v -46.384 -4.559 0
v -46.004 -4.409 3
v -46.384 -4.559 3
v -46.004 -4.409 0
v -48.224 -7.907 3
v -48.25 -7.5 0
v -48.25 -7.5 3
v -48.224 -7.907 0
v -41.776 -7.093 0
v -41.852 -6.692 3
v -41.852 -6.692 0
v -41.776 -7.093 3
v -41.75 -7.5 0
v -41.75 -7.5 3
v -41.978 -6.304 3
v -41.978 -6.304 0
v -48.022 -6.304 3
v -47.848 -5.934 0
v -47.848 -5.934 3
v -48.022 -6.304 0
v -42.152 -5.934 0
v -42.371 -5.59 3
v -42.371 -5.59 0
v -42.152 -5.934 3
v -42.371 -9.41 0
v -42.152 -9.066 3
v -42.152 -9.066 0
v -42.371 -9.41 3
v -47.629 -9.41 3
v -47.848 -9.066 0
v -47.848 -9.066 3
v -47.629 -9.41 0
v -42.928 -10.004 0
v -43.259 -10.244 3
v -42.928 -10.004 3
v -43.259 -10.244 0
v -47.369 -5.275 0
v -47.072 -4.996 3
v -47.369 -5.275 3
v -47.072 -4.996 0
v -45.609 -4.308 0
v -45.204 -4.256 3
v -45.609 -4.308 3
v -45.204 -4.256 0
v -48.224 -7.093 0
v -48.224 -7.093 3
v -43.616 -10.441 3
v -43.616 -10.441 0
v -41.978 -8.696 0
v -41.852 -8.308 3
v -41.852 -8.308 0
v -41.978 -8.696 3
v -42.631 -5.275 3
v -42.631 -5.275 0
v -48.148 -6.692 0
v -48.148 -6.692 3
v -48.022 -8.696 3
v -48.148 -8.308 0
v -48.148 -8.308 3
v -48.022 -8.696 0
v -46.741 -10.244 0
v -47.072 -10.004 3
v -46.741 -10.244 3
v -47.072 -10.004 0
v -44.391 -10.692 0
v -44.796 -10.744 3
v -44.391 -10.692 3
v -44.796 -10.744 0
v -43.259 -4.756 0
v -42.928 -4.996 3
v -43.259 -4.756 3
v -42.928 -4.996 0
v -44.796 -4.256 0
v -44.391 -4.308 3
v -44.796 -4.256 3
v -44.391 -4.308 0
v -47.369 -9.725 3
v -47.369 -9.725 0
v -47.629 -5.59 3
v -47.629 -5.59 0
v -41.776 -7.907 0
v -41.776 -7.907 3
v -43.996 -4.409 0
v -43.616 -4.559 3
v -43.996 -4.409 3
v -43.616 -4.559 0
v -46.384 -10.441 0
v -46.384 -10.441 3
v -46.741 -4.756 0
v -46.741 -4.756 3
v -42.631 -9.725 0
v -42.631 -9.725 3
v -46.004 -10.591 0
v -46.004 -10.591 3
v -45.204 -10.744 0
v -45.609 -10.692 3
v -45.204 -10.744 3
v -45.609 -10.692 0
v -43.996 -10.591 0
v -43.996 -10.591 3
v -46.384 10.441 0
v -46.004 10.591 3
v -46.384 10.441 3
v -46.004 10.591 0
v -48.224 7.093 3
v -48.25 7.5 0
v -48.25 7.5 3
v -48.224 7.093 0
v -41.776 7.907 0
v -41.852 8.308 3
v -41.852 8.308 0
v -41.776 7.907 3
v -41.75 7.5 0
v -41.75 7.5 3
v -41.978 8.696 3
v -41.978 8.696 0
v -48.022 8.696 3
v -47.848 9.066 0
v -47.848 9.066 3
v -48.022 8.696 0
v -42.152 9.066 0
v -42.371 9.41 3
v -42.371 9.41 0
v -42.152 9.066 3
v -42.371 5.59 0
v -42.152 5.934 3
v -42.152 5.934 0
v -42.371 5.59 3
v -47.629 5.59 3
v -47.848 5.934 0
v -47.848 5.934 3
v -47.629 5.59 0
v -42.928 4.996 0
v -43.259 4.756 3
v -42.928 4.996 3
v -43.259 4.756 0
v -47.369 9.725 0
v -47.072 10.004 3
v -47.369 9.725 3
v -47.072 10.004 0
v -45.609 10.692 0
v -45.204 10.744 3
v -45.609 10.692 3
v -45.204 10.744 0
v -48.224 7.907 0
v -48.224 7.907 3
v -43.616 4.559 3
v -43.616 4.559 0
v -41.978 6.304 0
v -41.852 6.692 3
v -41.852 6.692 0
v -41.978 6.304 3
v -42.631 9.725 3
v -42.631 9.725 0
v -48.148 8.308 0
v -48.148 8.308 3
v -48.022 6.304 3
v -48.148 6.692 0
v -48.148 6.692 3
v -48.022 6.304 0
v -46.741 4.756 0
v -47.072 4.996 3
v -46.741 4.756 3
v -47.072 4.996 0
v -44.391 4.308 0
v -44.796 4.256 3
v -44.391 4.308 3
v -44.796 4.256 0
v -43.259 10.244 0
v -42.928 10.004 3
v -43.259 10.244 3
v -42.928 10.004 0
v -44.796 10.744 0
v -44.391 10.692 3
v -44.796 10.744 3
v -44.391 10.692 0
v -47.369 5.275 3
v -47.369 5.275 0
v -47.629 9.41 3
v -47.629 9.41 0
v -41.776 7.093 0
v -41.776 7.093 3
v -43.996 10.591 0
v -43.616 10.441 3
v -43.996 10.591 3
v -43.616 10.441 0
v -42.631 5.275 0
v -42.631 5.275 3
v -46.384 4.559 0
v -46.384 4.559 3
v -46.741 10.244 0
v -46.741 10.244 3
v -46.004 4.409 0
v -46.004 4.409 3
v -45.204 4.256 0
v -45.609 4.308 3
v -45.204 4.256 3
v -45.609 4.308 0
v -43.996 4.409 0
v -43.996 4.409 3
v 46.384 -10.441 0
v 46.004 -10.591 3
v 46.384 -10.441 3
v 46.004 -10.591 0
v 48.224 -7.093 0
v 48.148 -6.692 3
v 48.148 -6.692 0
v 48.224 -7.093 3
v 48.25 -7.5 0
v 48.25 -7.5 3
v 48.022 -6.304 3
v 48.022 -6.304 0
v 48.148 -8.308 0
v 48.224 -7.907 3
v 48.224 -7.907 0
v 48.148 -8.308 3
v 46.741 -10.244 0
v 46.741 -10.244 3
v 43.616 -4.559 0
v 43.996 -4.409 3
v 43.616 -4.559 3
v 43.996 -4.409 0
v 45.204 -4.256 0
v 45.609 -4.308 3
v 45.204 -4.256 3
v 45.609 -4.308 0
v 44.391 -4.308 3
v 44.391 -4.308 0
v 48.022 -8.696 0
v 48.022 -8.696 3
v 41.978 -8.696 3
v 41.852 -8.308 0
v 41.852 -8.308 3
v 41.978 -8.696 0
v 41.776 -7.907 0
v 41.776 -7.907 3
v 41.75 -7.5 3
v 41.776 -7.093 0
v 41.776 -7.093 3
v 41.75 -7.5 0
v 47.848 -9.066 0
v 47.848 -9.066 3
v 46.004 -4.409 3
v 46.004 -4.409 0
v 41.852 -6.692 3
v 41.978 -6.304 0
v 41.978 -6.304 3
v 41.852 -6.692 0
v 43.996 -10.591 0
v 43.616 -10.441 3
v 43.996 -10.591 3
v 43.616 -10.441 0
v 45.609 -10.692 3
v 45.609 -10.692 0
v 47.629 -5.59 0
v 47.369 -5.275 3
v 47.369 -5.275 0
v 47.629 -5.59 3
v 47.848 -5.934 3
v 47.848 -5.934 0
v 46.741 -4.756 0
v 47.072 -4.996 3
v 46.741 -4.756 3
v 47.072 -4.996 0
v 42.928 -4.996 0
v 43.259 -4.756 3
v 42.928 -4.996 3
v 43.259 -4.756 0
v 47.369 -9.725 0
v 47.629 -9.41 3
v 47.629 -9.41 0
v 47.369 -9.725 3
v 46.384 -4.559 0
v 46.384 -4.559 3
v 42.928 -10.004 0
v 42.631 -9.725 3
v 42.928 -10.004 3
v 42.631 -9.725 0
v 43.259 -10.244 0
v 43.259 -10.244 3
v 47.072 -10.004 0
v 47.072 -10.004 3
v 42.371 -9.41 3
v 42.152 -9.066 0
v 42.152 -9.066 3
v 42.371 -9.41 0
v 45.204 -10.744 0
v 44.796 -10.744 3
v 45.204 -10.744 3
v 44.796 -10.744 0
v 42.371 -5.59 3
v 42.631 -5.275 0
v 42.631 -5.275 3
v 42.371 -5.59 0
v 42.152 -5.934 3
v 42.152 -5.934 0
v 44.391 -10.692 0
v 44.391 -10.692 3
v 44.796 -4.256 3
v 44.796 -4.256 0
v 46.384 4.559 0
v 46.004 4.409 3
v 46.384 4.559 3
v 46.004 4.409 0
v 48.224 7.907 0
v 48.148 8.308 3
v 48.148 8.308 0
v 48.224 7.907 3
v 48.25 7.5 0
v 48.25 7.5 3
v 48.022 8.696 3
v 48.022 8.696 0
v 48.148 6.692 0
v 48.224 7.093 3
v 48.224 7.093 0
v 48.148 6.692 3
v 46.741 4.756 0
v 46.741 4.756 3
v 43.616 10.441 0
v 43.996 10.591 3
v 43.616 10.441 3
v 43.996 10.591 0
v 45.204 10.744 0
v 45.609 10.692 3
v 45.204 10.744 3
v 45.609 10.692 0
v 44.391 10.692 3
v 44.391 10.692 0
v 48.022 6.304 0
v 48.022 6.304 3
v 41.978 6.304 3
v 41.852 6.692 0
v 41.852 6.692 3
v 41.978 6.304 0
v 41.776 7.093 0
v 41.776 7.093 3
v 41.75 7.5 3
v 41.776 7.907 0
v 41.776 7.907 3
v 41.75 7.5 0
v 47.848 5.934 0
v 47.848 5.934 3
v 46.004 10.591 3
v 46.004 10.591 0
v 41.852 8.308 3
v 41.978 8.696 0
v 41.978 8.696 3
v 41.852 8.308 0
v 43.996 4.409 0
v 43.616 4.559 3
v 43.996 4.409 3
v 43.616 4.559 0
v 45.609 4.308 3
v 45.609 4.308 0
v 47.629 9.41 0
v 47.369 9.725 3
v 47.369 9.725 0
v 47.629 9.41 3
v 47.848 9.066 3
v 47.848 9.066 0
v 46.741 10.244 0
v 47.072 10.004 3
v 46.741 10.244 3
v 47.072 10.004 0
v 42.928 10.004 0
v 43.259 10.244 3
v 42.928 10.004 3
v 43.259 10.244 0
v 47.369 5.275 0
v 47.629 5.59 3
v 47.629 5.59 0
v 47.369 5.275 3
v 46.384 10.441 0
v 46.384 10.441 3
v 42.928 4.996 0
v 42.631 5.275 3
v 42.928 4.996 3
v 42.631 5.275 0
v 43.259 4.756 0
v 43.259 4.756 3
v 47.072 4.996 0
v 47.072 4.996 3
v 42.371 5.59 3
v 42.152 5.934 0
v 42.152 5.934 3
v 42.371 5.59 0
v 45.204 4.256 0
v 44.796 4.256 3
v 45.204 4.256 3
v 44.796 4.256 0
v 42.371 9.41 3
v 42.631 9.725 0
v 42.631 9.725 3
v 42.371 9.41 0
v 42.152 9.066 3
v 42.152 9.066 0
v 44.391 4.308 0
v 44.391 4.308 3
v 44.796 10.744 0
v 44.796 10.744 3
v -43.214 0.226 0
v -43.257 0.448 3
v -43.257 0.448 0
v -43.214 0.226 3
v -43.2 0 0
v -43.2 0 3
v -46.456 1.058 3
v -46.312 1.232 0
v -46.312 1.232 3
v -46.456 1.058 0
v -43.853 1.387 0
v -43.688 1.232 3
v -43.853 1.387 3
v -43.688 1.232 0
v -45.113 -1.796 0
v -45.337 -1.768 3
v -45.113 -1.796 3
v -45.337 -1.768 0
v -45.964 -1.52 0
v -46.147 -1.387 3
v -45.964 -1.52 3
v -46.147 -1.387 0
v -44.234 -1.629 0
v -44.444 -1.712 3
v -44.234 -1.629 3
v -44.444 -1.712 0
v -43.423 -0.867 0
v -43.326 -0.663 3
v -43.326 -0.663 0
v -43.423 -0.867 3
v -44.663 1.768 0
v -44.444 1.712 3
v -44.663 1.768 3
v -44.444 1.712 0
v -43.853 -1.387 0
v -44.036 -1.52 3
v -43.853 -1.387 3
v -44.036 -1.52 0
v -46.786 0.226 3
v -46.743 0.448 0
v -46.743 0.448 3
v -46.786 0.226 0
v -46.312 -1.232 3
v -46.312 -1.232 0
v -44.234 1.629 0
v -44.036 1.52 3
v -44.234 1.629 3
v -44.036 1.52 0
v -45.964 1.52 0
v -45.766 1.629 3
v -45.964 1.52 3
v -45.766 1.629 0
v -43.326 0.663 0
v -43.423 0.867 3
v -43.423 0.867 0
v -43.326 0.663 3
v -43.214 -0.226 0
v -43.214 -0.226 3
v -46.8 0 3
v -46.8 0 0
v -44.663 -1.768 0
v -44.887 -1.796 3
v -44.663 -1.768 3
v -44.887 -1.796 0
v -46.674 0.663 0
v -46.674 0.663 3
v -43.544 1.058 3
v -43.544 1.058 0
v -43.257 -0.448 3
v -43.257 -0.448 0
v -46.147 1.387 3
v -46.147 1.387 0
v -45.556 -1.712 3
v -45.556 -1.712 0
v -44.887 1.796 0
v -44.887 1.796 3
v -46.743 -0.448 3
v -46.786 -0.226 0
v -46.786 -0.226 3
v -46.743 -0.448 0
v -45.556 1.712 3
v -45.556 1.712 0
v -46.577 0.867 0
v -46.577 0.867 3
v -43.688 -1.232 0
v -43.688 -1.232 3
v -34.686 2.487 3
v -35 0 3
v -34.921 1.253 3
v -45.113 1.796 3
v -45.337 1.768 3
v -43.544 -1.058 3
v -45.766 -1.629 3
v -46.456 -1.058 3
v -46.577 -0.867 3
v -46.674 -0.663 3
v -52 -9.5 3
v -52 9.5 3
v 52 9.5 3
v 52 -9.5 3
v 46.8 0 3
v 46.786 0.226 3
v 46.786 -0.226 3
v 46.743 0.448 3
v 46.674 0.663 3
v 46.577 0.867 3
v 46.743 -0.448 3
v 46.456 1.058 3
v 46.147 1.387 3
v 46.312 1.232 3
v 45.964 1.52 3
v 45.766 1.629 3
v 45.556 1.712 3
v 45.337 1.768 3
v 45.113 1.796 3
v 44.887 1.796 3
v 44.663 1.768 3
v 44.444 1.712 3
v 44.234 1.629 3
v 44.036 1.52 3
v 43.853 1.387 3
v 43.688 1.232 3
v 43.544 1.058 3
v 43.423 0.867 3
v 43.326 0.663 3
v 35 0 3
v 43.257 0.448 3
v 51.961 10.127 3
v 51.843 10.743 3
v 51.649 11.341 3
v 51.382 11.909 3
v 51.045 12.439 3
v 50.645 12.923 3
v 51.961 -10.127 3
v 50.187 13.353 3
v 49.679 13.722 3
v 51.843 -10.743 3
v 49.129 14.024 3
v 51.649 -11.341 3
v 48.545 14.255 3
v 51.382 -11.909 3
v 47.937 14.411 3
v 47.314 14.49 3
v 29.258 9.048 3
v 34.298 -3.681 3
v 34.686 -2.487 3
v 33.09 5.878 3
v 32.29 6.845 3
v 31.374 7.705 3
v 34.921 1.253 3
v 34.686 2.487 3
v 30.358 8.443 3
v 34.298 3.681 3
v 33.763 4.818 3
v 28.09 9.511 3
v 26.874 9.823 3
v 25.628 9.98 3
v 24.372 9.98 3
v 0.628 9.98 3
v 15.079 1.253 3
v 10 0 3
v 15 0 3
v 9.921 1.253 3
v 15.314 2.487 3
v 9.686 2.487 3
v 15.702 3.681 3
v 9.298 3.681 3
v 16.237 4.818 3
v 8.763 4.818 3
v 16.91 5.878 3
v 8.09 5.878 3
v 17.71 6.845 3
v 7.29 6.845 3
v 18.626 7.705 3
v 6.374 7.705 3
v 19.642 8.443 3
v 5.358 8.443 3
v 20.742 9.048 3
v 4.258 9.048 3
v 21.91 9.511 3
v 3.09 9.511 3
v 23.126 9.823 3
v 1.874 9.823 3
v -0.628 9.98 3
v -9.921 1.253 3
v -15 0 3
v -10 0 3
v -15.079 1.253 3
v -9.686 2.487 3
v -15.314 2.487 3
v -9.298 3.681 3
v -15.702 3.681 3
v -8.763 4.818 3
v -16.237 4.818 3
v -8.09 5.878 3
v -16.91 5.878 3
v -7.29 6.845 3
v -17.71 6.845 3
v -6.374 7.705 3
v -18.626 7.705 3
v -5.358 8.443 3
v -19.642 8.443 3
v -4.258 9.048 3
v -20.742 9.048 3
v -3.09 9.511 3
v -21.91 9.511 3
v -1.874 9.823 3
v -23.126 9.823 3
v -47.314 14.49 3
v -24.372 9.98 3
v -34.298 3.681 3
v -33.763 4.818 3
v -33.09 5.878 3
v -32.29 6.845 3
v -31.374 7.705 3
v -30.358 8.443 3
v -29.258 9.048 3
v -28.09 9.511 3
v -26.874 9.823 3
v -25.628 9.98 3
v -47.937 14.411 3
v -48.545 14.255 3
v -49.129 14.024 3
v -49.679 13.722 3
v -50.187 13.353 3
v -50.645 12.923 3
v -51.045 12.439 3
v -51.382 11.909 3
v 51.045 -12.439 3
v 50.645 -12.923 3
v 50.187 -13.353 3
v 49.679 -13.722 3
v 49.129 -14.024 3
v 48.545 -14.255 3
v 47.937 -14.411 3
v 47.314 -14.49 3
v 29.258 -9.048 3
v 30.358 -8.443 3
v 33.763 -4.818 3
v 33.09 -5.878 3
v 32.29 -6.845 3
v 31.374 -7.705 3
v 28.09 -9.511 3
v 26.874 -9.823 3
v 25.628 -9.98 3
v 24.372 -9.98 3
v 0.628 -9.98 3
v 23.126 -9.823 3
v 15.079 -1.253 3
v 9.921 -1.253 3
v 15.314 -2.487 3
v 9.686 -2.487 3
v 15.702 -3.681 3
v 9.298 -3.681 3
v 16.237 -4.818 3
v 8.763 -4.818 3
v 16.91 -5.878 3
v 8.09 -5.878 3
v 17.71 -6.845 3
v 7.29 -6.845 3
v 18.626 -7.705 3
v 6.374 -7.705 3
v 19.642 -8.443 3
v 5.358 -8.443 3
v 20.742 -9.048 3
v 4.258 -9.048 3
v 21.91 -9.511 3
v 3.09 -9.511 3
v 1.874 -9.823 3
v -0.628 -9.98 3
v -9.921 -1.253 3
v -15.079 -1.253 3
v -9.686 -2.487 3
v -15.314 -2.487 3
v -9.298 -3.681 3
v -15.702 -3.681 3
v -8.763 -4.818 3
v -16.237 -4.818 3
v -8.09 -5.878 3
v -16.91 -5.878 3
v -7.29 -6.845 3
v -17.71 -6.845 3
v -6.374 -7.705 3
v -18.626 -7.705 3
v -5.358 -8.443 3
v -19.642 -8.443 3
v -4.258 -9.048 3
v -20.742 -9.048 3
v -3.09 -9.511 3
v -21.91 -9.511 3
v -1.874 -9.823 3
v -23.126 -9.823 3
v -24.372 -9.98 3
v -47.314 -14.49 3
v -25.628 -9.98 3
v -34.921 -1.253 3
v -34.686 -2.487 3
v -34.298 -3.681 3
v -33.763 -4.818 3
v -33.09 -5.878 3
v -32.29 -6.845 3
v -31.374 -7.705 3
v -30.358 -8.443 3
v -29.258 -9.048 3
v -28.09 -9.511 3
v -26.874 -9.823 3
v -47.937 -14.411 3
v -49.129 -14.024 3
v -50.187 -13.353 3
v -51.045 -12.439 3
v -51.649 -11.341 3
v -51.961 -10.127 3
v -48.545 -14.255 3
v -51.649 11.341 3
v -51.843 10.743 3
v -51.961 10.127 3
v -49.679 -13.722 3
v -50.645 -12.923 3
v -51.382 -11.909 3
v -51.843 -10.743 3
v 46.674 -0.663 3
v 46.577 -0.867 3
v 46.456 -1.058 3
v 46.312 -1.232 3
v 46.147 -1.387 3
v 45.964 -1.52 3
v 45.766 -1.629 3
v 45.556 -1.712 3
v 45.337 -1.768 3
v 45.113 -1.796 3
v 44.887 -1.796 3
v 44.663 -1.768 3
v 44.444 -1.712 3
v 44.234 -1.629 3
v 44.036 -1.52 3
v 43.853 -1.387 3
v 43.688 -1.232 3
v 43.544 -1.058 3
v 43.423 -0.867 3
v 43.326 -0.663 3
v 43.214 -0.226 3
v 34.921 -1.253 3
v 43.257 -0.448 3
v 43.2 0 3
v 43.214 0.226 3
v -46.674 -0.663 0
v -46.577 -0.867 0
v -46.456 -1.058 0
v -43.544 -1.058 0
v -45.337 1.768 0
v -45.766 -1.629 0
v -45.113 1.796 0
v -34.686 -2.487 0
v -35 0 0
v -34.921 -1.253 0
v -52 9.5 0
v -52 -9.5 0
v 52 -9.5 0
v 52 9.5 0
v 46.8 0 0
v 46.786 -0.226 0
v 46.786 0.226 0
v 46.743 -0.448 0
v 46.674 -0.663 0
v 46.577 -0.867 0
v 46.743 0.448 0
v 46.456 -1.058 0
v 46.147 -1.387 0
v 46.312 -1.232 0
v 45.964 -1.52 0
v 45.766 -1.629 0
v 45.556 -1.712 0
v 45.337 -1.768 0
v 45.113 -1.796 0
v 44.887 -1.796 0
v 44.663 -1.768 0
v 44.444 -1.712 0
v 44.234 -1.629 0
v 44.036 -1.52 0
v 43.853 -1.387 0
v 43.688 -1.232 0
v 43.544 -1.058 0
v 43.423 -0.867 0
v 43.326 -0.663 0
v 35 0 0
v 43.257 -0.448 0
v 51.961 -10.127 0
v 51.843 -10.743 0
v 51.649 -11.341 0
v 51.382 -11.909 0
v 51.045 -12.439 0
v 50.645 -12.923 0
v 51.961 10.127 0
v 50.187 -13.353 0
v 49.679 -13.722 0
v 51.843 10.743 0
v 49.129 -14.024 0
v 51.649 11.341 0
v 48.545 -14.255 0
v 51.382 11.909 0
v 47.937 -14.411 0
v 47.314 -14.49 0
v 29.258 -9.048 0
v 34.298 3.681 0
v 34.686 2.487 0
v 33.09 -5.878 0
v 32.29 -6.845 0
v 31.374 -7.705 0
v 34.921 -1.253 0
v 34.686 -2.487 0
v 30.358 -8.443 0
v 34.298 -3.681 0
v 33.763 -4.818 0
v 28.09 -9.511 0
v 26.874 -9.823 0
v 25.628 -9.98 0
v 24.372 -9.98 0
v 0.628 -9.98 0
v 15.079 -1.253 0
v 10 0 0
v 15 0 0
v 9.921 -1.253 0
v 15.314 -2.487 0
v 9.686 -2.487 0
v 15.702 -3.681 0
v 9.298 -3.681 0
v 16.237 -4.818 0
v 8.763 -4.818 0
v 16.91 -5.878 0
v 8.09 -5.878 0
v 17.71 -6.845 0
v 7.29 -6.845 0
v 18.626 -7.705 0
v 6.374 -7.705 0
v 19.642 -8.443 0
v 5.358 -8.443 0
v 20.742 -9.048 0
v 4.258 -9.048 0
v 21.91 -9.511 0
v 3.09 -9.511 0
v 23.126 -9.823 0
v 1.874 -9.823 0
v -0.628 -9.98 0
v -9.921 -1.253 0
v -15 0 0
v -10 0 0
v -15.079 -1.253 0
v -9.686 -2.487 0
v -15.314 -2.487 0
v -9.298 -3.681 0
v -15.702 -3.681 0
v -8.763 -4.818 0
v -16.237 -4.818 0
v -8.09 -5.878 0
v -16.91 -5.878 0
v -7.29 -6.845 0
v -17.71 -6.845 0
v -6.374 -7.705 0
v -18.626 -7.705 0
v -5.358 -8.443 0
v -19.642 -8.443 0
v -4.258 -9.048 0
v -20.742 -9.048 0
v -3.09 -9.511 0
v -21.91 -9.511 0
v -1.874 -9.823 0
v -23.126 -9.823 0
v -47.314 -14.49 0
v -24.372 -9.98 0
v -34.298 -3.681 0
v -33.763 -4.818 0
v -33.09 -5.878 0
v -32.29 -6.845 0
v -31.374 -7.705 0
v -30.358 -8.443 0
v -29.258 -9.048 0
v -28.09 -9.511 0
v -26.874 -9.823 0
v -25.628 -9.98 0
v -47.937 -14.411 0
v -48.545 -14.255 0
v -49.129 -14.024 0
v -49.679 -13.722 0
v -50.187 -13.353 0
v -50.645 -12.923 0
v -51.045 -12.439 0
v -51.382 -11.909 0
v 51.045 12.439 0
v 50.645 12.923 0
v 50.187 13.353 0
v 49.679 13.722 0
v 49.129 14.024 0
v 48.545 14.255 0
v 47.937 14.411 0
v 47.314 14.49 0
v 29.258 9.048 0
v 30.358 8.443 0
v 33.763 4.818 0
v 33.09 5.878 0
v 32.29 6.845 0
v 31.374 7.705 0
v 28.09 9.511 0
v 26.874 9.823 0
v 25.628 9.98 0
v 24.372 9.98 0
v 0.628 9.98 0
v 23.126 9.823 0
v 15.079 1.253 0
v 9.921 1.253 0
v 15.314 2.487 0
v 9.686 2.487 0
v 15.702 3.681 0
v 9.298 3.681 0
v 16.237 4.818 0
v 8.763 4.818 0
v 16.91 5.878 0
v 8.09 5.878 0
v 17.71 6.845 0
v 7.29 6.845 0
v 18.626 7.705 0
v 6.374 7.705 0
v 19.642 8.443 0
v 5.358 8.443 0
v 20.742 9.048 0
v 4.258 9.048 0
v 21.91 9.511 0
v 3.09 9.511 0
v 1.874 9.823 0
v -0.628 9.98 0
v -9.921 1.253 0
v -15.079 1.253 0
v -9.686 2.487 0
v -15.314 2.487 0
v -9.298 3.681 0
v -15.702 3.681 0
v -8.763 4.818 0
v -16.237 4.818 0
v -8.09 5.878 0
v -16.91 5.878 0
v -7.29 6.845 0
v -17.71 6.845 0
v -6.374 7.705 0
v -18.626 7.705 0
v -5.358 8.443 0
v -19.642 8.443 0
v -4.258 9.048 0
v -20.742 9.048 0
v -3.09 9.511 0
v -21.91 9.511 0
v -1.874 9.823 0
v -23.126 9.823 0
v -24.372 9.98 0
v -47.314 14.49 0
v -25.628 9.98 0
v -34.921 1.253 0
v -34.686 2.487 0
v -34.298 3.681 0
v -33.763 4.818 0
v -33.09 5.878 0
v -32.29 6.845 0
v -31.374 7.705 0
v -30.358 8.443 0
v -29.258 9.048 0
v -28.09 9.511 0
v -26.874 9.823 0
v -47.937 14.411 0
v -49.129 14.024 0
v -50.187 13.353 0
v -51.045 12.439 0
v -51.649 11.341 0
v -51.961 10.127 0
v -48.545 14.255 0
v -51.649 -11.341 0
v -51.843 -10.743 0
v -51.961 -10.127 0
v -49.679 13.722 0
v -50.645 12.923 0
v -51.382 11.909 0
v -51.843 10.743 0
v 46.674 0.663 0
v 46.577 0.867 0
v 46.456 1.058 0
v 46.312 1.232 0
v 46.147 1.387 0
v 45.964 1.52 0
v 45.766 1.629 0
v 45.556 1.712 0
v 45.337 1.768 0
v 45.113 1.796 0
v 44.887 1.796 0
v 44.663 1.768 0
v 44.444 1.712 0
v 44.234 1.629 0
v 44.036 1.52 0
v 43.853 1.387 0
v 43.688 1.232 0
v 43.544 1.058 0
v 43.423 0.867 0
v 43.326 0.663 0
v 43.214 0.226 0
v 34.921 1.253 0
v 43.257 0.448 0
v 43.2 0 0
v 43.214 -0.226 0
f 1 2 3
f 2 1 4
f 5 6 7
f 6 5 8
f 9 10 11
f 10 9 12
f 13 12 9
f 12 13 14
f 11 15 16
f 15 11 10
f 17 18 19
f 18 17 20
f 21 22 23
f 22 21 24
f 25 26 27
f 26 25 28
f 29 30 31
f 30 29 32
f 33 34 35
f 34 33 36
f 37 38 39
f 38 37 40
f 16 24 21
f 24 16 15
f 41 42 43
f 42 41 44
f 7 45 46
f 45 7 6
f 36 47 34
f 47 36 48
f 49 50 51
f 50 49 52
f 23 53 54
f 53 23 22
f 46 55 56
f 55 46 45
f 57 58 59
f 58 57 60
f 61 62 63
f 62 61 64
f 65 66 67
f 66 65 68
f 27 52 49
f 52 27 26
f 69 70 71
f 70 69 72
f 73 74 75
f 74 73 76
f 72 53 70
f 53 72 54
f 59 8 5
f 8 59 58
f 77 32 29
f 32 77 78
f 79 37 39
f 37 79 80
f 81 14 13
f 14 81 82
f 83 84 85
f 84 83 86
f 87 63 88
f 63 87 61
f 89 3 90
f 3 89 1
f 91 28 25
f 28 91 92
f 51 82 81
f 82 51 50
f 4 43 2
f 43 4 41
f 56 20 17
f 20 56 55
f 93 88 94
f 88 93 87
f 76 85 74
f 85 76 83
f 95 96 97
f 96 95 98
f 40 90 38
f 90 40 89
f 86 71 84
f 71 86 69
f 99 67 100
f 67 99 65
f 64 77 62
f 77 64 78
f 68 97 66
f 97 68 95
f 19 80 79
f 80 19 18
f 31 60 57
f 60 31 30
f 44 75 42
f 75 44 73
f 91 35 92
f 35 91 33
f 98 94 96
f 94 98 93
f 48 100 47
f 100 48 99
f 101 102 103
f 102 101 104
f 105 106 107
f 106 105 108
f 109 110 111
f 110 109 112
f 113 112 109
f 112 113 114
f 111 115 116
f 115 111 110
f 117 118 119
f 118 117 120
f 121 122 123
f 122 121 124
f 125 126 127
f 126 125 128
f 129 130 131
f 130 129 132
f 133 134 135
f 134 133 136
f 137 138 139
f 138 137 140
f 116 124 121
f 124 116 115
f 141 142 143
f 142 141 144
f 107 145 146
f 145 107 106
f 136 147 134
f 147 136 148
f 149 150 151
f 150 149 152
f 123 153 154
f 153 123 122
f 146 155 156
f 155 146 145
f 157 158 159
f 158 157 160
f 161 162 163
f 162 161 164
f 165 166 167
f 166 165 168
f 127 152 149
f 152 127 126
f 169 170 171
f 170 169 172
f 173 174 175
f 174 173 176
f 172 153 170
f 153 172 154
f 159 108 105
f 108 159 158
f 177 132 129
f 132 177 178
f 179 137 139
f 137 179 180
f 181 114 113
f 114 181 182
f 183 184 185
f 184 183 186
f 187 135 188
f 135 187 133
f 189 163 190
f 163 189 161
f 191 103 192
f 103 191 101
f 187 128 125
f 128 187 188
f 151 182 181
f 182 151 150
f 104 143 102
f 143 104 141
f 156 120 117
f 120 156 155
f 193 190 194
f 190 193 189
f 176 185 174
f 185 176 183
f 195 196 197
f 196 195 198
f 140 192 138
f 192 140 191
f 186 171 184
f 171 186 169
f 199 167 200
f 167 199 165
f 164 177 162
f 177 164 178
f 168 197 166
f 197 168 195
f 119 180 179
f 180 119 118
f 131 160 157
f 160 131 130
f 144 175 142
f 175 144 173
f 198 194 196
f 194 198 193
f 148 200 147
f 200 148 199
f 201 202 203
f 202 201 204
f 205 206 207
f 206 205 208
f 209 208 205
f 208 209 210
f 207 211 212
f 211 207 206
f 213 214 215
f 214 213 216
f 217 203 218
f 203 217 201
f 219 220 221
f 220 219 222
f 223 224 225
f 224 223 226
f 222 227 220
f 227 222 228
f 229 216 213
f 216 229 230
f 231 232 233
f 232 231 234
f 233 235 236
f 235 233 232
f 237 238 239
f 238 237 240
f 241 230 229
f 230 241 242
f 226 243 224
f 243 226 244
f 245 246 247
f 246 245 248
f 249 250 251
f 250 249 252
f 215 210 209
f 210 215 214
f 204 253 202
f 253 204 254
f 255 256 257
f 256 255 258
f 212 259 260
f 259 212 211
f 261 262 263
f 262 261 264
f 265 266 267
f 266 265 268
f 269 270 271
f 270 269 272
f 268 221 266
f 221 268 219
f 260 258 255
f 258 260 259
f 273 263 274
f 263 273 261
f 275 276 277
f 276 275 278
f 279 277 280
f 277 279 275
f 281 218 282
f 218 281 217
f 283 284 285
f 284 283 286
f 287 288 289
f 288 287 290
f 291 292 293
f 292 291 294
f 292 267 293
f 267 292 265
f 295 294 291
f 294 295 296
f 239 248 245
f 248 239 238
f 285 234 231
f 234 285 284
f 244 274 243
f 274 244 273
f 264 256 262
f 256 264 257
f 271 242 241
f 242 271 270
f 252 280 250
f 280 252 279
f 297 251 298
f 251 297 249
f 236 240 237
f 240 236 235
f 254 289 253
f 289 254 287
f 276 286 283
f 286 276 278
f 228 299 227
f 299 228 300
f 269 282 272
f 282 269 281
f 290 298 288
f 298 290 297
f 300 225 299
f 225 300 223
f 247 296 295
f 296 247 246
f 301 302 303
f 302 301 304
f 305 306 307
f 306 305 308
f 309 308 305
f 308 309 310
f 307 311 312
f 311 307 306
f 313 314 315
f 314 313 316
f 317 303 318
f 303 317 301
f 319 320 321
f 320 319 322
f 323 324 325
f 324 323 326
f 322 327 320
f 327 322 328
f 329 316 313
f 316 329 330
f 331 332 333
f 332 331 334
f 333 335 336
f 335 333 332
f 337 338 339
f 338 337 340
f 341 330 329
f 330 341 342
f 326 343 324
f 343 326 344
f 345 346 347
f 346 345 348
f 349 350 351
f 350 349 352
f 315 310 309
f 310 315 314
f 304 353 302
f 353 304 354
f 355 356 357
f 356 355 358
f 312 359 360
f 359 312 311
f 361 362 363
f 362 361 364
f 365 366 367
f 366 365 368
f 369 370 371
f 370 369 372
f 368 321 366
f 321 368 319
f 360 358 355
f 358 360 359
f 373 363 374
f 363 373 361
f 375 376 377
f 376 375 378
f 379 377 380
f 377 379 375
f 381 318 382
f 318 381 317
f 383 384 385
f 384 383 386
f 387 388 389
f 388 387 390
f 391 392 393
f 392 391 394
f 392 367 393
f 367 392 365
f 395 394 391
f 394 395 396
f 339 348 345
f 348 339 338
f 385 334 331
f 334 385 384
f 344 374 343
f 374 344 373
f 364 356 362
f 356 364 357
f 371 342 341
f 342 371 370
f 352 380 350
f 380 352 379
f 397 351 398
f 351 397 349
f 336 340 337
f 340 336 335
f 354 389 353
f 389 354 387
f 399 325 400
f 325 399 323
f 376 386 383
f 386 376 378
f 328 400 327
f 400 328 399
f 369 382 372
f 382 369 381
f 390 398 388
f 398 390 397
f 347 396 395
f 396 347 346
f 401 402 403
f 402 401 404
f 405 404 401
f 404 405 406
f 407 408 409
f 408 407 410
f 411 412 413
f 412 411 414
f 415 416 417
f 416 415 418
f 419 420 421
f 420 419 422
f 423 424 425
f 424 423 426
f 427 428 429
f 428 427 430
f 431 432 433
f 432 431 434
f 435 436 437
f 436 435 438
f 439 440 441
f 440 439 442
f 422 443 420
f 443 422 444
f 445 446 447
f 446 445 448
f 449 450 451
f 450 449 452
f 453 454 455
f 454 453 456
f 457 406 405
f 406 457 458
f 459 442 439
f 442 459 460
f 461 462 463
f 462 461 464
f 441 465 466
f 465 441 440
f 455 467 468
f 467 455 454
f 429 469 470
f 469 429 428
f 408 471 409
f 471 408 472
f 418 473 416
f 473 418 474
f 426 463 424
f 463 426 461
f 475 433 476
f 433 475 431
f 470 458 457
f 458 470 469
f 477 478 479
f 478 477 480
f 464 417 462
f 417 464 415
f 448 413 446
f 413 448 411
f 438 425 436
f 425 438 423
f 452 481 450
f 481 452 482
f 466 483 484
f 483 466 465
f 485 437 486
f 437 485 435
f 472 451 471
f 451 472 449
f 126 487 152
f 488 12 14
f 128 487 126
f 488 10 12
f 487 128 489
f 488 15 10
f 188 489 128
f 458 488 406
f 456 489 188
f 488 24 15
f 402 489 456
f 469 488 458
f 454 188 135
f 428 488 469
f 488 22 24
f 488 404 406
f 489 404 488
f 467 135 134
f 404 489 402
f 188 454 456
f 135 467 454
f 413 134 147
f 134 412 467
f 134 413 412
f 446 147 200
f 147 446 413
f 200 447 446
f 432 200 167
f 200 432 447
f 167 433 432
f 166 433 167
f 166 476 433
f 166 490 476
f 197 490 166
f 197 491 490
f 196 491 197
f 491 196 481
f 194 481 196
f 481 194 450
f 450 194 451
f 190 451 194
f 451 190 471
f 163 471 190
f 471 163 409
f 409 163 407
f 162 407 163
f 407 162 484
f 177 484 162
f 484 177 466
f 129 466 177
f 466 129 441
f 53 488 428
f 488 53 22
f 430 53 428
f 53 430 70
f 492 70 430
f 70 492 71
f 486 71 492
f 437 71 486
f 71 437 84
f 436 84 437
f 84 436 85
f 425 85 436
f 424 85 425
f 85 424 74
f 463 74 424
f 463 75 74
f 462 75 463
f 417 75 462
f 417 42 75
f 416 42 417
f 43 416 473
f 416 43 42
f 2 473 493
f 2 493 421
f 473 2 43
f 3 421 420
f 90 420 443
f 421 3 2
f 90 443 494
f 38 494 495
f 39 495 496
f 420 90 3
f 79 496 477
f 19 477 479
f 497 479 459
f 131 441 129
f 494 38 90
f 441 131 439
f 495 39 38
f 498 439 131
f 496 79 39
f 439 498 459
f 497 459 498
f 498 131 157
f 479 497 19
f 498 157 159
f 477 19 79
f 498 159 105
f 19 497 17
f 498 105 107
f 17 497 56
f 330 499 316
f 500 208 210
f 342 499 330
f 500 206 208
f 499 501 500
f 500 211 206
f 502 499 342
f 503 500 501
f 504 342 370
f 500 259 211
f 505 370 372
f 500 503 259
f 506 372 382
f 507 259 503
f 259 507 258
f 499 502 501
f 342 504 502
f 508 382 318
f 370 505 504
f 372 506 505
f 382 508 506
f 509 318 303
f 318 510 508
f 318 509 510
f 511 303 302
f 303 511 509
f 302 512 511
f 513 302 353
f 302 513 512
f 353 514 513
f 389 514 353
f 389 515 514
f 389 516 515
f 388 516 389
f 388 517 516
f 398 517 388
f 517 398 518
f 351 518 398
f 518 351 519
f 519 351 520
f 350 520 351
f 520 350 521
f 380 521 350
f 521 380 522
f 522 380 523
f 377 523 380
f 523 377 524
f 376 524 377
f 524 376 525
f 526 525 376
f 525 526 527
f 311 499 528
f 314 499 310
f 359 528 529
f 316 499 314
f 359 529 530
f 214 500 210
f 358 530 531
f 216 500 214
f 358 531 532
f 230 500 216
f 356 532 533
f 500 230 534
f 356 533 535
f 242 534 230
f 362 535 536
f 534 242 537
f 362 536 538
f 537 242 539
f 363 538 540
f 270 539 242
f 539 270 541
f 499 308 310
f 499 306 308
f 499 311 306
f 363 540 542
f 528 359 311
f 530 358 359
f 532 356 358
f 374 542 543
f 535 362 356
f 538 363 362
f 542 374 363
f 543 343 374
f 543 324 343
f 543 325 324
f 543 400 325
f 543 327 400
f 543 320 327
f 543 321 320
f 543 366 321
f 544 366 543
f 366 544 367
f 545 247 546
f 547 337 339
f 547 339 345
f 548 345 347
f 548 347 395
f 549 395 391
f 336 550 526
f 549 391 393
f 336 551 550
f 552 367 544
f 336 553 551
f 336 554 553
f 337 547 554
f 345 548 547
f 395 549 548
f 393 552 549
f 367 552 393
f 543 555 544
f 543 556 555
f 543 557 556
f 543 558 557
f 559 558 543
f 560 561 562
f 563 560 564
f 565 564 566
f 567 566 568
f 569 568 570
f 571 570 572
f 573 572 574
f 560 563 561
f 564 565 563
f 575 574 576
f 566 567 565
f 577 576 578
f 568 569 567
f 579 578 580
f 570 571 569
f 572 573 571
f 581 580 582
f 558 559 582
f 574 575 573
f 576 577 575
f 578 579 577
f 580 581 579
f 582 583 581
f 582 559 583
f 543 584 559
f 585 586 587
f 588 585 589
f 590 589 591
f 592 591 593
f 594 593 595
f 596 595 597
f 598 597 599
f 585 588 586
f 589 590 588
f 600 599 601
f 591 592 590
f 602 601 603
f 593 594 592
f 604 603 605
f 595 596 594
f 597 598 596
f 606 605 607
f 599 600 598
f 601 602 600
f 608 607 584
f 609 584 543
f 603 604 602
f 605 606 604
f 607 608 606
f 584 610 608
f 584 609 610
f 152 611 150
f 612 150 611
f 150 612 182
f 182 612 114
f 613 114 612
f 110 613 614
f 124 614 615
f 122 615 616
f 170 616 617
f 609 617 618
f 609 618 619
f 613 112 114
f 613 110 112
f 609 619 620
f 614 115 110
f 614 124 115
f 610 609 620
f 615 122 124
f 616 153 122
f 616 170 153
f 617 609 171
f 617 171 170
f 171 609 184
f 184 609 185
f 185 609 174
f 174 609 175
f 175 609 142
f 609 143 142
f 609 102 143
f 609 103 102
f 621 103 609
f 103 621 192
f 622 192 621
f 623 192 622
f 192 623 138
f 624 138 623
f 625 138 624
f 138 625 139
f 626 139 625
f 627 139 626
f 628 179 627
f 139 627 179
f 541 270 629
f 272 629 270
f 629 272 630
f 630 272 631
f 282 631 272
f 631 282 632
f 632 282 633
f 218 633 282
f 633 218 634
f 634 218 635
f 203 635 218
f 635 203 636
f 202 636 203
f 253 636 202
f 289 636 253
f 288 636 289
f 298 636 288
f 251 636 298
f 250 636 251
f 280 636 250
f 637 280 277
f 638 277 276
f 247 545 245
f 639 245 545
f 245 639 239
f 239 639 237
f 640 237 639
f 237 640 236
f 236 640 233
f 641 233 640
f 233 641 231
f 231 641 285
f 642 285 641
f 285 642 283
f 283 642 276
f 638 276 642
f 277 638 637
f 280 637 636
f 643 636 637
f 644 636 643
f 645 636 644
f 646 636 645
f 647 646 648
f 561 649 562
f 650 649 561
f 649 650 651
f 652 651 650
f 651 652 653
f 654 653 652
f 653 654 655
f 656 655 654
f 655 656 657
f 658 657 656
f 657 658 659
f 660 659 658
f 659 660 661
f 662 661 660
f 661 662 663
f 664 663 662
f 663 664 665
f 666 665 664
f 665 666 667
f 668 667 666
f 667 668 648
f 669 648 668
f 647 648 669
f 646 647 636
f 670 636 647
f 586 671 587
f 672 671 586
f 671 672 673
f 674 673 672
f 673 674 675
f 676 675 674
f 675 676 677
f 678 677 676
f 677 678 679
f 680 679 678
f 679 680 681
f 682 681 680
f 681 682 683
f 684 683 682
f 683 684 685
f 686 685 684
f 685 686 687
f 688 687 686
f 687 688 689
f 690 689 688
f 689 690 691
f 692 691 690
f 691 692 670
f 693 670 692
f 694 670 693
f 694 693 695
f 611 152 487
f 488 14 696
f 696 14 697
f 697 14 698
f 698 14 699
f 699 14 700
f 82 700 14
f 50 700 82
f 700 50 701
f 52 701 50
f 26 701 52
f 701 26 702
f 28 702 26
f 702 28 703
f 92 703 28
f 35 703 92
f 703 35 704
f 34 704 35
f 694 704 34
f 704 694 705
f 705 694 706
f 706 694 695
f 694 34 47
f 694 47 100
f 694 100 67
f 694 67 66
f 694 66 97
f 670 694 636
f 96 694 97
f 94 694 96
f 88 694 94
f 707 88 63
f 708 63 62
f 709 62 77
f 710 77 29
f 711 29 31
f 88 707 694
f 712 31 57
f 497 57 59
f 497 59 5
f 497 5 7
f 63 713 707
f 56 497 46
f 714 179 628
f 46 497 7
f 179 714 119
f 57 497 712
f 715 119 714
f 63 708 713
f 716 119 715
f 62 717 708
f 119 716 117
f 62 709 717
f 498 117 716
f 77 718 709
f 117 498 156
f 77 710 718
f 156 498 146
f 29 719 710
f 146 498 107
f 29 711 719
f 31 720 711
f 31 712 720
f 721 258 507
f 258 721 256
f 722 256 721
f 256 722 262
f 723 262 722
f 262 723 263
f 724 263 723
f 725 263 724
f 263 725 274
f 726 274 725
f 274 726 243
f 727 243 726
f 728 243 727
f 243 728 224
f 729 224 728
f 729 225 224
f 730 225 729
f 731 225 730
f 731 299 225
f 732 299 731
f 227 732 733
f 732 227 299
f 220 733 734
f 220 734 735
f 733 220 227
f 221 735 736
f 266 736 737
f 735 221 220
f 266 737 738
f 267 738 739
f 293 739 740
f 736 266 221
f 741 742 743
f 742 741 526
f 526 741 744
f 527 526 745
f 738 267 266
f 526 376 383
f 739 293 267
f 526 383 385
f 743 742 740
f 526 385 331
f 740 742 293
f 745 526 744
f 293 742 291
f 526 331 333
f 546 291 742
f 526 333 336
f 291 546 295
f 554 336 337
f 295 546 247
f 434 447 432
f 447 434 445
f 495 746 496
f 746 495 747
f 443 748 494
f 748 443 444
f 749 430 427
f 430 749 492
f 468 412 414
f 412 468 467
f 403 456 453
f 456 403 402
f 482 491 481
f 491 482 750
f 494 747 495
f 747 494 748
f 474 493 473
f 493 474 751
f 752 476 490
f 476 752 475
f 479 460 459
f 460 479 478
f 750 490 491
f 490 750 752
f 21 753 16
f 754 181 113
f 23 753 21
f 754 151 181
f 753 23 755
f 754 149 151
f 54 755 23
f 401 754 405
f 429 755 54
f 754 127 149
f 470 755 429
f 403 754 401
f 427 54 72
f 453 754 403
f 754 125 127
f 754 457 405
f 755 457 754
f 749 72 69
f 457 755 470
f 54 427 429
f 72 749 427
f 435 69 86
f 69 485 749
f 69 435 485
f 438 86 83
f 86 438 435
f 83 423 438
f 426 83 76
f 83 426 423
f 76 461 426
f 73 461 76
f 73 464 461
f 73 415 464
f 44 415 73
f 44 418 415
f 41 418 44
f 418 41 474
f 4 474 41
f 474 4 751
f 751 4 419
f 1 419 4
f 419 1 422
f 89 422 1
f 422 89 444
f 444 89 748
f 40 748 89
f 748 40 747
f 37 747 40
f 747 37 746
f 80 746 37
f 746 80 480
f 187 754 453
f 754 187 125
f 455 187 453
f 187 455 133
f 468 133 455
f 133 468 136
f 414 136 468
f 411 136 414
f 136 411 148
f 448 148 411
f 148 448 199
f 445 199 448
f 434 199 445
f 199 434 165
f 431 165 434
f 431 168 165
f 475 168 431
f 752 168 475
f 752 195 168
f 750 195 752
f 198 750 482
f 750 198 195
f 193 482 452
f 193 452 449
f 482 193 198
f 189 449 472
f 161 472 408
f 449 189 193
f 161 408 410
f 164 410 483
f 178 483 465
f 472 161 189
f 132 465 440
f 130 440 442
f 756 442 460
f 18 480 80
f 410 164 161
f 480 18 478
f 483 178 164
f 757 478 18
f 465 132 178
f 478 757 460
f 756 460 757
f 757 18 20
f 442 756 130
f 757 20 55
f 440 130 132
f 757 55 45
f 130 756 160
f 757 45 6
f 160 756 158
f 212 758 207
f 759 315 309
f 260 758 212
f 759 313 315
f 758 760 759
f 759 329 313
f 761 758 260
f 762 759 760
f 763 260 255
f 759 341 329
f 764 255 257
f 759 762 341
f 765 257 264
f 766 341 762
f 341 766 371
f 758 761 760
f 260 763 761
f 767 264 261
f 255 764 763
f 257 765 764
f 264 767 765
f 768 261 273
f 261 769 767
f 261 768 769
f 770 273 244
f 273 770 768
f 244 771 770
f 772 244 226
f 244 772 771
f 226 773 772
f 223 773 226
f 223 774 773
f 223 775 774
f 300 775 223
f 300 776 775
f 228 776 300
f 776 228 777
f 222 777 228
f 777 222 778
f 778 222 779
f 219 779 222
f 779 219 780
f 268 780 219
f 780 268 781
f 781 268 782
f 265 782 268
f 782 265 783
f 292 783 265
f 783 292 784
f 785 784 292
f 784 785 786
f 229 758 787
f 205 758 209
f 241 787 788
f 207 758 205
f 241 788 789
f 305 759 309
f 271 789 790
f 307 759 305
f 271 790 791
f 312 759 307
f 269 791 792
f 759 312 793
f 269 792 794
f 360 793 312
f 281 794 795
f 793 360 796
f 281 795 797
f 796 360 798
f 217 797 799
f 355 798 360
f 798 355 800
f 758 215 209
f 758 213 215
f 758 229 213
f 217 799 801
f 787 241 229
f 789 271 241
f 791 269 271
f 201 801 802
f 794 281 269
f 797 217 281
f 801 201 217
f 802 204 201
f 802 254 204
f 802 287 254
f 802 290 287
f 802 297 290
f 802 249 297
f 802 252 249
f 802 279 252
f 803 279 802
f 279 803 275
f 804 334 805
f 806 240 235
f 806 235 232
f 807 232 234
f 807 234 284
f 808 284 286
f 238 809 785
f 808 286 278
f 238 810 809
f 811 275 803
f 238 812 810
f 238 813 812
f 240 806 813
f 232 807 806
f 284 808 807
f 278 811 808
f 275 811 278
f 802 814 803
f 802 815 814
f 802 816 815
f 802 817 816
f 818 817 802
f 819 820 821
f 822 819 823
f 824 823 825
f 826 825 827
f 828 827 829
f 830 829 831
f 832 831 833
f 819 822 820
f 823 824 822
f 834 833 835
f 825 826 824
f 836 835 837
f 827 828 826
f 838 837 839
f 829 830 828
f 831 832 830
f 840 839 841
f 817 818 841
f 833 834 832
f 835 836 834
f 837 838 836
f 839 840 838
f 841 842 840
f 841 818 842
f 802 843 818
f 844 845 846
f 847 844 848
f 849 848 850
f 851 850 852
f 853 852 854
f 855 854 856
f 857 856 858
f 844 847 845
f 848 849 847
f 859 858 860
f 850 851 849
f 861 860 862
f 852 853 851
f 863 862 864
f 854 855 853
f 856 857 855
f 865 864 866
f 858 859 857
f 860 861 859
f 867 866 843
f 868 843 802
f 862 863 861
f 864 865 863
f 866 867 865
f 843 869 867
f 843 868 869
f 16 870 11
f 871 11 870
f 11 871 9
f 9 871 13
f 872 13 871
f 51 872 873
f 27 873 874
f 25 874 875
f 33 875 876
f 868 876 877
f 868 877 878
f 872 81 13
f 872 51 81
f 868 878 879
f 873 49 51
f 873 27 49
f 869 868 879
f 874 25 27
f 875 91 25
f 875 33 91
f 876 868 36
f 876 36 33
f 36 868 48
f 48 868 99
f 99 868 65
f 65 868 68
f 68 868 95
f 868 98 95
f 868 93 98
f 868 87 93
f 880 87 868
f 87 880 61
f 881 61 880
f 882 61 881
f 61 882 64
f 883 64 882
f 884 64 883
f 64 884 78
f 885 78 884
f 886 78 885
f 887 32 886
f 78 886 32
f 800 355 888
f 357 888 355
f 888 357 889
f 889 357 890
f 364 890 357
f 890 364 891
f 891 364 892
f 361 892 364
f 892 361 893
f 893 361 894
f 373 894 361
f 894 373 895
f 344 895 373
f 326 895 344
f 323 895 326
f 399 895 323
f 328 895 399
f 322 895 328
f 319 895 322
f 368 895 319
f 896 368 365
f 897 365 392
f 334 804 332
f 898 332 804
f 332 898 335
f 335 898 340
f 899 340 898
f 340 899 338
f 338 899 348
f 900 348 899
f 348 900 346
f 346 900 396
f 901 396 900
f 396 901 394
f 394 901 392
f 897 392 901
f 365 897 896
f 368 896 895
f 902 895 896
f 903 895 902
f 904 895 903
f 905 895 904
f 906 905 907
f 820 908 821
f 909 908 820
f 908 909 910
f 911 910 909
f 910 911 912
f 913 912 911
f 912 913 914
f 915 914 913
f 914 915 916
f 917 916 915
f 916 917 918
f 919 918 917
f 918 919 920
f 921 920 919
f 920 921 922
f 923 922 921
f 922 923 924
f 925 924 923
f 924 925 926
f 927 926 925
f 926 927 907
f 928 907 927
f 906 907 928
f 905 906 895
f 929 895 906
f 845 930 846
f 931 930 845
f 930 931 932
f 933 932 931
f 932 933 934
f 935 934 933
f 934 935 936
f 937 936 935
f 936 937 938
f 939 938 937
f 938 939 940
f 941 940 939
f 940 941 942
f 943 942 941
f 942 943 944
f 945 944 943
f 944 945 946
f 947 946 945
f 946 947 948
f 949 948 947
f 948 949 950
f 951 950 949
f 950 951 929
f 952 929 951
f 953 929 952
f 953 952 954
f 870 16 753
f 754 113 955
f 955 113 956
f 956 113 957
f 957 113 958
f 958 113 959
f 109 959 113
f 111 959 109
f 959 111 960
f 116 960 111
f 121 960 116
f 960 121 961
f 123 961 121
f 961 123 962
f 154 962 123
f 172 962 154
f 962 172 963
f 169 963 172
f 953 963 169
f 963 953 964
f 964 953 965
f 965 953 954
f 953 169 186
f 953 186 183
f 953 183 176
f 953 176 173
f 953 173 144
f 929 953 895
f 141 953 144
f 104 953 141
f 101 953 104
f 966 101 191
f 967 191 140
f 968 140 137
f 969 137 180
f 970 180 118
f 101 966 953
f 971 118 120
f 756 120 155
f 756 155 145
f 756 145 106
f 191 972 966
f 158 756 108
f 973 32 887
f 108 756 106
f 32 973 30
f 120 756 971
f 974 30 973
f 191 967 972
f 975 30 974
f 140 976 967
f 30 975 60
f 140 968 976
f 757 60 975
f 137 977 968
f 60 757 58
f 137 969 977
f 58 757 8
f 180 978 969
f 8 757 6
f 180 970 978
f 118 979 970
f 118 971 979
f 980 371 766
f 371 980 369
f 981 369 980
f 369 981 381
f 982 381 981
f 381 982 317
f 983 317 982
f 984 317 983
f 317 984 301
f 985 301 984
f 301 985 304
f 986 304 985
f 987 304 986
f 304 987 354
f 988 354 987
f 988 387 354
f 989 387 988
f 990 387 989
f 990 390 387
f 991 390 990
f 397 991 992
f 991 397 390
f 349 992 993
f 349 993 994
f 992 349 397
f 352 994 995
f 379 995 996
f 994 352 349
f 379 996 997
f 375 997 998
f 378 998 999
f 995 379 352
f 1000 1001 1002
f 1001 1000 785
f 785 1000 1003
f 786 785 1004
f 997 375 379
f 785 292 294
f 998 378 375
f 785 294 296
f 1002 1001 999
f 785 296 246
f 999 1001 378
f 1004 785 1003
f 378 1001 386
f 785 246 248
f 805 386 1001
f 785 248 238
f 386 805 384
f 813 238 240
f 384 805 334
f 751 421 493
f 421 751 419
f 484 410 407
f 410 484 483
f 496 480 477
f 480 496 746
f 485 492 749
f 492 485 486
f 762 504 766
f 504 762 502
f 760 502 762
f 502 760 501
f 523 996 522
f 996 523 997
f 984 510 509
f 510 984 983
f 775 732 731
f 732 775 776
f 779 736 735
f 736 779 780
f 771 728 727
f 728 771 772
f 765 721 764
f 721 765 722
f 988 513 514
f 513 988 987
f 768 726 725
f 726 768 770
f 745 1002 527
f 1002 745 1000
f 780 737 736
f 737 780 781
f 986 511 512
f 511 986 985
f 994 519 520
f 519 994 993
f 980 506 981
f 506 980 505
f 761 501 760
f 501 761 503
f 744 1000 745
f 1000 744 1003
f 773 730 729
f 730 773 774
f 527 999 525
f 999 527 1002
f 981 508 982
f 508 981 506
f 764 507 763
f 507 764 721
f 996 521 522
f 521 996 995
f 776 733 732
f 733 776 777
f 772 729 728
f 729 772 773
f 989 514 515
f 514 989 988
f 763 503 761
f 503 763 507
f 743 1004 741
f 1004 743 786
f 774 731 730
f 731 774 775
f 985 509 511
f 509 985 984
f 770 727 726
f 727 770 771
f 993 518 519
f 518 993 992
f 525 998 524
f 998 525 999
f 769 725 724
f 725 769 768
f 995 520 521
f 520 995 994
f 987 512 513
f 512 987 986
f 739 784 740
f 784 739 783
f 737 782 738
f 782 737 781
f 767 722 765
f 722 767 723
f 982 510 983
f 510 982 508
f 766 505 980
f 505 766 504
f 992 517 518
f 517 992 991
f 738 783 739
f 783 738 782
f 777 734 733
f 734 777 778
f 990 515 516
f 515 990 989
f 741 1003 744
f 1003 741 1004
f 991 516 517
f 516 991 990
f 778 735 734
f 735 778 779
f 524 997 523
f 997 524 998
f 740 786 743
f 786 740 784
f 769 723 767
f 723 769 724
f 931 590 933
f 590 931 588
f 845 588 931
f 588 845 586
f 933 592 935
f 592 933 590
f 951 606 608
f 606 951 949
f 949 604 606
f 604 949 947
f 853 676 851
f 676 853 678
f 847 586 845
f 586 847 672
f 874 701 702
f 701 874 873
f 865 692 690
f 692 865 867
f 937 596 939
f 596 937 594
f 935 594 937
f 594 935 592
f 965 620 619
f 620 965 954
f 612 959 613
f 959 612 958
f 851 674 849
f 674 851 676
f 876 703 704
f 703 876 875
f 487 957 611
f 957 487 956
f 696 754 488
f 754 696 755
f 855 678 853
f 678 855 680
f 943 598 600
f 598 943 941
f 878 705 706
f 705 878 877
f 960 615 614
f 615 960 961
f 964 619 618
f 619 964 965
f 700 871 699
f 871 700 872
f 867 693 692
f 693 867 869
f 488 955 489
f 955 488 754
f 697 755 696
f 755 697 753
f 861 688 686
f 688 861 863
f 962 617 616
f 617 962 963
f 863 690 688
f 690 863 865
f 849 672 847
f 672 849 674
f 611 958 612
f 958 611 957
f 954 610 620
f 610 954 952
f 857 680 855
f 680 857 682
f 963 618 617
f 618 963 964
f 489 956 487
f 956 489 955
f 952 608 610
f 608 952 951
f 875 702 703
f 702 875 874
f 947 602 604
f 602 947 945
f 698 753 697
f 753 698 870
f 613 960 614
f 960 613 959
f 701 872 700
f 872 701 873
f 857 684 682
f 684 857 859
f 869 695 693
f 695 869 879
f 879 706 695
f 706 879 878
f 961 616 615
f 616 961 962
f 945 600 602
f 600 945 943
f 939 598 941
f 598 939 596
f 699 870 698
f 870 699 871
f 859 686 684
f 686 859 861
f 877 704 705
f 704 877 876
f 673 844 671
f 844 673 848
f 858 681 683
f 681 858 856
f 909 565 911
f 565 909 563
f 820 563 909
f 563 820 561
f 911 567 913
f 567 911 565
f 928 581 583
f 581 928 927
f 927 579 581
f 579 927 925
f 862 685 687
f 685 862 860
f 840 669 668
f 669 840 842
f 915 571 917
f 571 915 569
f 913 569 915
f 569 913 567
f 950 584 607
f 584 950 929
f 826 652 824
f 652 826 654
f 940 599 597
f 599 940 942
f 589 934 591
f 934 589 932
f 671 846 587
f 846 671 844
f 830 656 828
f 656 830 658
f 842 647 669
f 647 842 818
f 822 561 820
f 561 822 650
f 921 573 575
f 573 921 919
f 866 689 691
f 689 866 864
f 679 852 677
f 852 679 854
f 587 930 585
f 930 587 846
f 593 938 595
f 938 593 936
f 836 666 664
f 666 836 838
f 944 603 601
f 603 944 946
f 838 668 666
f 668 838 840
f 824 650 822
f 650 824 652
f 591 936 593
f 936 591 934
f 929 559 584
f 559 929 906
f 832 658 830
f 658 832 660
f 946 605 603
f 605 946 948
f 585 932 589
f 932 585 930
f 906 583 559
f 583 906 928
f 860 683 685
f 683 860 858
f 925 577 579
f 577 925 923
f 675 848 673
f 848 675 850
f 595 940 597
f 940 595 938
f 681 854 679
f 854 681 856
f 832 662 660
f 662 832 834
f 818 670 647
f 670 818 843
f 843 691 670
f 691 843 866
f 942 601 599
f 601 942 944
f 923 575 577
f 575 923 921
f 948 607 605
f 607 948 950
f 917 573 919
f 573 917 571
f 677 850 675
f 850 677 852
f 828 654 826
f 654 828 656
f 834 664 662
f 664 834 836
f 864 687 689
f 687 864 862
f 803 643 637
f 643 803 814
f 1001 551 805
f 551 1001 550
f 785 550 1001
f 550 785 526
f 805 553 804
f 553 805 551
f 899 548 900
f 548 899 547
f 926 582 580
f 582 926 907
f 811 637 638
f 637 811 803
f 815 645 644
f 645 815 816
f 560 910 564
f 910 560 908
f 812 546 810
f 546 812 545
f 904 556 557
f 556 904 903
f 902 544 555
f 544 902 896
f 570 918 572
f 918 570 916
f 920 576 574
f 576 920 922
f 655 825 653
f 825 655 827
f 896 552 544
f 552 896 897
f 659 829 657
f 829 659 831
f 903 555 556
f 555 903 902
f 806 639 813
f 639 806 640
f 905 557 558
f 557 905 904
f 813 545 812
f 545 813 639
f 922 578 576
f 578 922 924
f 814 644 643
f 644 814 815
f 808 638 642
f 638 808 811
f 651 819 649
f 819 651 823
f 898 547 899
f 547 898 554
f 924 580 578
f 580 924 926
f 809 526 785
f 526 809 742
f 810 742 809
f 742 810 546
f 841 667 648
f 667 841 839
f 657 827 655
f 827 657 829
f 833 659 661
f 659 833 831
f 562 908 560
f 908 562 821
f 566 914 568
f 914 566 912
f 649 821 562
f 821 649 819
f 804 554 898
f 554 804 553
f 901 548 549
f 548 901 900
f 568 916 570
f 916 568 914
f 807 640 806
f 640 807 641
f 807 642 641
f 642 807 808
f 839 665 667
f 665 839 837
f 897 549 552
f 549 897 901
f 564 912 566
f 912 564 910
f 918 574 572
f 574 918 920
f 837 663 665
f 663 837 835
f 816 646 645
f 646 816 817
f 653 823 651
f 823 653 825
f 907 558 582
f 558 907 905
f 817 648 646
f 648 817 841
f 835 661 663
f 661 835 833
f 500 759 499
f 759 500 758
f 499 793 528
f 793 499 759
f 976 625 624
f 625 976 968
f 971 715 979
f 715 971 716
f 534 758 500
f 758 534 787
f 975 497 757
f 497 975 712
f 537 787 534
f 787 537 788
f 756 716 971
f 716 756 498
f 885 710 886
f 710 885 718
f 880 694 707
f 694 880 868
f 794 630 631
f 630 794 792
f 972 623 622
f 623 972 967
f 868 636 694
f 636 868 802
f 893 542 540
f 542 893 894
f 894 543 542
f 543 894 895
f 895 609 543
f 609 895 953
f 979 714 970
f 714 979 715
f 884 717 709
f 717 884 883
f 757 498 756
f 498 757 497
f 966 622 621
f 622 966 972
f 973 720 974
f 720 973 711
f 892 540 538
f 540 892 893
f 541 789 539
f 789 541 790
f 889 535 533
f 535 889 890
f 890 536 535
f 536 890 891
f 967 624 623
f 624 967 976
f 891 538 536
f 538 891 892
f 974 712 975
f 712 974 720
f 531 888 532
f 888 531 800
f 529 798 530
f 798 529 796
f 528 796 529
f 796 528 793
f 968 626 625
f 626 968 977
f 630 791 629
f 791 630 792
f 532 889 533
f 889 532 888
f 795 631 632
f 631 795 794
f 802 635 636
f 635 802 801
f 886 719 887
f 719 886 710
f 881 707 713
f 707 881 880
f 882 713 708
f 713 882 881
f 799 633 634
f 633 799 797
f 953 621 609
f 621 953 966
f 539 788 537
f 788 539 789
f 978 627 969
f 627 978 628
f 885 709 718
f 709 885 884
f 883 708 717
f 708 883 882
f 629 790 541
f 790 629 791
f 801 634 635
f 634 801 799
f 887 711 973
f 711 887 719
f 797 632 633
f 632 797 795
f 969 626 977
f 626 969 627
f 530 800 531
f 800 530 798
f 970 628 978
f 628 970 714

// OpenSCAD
$fn = 50;


difference() {
	union() {
		hull() {
			translate(v = [-47.0000000000, 9.5000000000, 0]) {
				cylinder(h = 3, r = 5);
			}
			translate(v = [47.0000000000, 9.5000000000, 0]) {
				cylinder(h = 3, r = 5);
			}
			translate(v = [-47.0000000000, -9.5000000000, 0]) {
				cylinder(h = 3, r = 5);
			}
			translate(v = [47.0000000000, -9.5000000000, 0]) {
				cylinder(h = 3, r = 5);
			}
		}
	}
	union() {
		#translate(v = [-45.0000000000, -7.5000000000, 0]) {
			cylinder(h = 3, r = 3.2500000000);
		}
		#translate(v = [-45.0000000000, 7.5000000000, 0]) {
			cylinder(h = 3, r = 3.2500000000);
		}
		#translate(v = [45.0000000000, -7.5000000000, 0]) {
			cylinder(h = 3, r = 3.2500000000);
		}
		#translate(v = [45.0000000000, 7.5000000000, 0]) {
			cylinder(h = 3, r = 3.2500000000);
		}
		#translate(v = [-45.0000000000, -7.5000000000, -100.0000000000]) {
			cylinder(h = 200, r = 3.2500000000);
		}
		#translate(v = [-45.0000000000, 7.5000000000, -100.0000000000]) {
			cylinder(h = 200, r = 3.2500000000);
		}
		#translate(v = [45.0000000000, -7.5000000000, -100.0000000000]) {
			cylinder(h = 200, r = 3.2500000000);
		}
		#translate(v = [45.0000000000, 7.5000000000, -100.0000000000]) {
			cylinder(h = 200, r = 3.2500000000);
		}
		#translate(v = [-45.0000000000, -7.5000000000, 0]) {
			cylinder(h = 3, r = 1.8000000000);
		}
		#translate(v = [-45.0000000000, 0.0000000000, 0]) {
			cylinder(h = 3, r = 1.8000000000);
		}
		#translate(v = [-45.0000000000, 7.5000000000, 0]) {
			cylinder(h = 3, r = 1.8000000000);
		}
		#translate(v = [45.0000000000, -7.5000000000, 0]) {
			cylinder(h = 3, r = 1.8000000000);
		}
		#translate(v = [45.0000000000, 0.0000000000, 0]) {
			cylinder(h = 3, r = 1.8000000000);
		}
		#translate(v = [45.0000000000, 7.5000000000, 0]) {
			cylinder(h = 3, r = 1.8000000000);
		}
		#translate(v = [-45.0000000000, -7.5000000000, 0]) {
			cylinder(h = 3, r = 1.8000000000);
		}
		#translate(v = [-45.0000000000, 0.0000000000, 0]) {
			cylinder(h = 3, r = 1.8000000000);
		}
		#translate(v = [-45.0000000000, 7.5000000000, 0]) {
			cylinder(h = 3, r = 1.8000000000);
		}
		#translate(v = [45.0000000000, -7.5000000000, 0]) {
			cylinder(h = 3, r = 1.8000000000);
		}
		#translate(v = [45.0000000000, 0.0000000000, 0]) {
			cylinder(h = 3, r = 1.8000000000);
		}
		#translate(v = [45.0000000000, 7.5000000000, 0]) {
			cylinder(h = 3, r = 1.8000000000);
		}
		#translate(v = [-45.0000000000, -7.5000000000, 0]) {
			cylinder(h = 3, r = 1.8000000000);
		}
		#translate(v = [-45.0000000000, 0.0000000000, 0]) {
			cylinder(h = 3, r = 1.8000000000);
		}
		#translate(v = [-45.0000000000, 7.5000000000, 0]) {
			cylinder(h = 3, r = 1.8000000000);
		}
		#translate(v = [45.0000000000, -7.5000000000, 0]) {
			cylinder(h = 3, r = 1.8000000000);
		}
		#translate(v = [45.0000000000, 0.0000000000, 0]) {
			cylinder(h = 3, r = 1.8000000000);
		}
		#translate(v = [45.0000000000, 7.5000000000, 0]) {
			cylinder(h = 3, r = 1.8000000000);
		}
		#translate(v = [-25.0000000000, 0, 0]) {
			cylinder(h = 3, r = 10.0000000000);
		}
		#cylinder(h = 3, r = 10.0000000000);
		#translate(v = [25.0000000000, 0, 0]) {
			cylinder(h = 3, r = 10.0000000000);
		}
	}
}
